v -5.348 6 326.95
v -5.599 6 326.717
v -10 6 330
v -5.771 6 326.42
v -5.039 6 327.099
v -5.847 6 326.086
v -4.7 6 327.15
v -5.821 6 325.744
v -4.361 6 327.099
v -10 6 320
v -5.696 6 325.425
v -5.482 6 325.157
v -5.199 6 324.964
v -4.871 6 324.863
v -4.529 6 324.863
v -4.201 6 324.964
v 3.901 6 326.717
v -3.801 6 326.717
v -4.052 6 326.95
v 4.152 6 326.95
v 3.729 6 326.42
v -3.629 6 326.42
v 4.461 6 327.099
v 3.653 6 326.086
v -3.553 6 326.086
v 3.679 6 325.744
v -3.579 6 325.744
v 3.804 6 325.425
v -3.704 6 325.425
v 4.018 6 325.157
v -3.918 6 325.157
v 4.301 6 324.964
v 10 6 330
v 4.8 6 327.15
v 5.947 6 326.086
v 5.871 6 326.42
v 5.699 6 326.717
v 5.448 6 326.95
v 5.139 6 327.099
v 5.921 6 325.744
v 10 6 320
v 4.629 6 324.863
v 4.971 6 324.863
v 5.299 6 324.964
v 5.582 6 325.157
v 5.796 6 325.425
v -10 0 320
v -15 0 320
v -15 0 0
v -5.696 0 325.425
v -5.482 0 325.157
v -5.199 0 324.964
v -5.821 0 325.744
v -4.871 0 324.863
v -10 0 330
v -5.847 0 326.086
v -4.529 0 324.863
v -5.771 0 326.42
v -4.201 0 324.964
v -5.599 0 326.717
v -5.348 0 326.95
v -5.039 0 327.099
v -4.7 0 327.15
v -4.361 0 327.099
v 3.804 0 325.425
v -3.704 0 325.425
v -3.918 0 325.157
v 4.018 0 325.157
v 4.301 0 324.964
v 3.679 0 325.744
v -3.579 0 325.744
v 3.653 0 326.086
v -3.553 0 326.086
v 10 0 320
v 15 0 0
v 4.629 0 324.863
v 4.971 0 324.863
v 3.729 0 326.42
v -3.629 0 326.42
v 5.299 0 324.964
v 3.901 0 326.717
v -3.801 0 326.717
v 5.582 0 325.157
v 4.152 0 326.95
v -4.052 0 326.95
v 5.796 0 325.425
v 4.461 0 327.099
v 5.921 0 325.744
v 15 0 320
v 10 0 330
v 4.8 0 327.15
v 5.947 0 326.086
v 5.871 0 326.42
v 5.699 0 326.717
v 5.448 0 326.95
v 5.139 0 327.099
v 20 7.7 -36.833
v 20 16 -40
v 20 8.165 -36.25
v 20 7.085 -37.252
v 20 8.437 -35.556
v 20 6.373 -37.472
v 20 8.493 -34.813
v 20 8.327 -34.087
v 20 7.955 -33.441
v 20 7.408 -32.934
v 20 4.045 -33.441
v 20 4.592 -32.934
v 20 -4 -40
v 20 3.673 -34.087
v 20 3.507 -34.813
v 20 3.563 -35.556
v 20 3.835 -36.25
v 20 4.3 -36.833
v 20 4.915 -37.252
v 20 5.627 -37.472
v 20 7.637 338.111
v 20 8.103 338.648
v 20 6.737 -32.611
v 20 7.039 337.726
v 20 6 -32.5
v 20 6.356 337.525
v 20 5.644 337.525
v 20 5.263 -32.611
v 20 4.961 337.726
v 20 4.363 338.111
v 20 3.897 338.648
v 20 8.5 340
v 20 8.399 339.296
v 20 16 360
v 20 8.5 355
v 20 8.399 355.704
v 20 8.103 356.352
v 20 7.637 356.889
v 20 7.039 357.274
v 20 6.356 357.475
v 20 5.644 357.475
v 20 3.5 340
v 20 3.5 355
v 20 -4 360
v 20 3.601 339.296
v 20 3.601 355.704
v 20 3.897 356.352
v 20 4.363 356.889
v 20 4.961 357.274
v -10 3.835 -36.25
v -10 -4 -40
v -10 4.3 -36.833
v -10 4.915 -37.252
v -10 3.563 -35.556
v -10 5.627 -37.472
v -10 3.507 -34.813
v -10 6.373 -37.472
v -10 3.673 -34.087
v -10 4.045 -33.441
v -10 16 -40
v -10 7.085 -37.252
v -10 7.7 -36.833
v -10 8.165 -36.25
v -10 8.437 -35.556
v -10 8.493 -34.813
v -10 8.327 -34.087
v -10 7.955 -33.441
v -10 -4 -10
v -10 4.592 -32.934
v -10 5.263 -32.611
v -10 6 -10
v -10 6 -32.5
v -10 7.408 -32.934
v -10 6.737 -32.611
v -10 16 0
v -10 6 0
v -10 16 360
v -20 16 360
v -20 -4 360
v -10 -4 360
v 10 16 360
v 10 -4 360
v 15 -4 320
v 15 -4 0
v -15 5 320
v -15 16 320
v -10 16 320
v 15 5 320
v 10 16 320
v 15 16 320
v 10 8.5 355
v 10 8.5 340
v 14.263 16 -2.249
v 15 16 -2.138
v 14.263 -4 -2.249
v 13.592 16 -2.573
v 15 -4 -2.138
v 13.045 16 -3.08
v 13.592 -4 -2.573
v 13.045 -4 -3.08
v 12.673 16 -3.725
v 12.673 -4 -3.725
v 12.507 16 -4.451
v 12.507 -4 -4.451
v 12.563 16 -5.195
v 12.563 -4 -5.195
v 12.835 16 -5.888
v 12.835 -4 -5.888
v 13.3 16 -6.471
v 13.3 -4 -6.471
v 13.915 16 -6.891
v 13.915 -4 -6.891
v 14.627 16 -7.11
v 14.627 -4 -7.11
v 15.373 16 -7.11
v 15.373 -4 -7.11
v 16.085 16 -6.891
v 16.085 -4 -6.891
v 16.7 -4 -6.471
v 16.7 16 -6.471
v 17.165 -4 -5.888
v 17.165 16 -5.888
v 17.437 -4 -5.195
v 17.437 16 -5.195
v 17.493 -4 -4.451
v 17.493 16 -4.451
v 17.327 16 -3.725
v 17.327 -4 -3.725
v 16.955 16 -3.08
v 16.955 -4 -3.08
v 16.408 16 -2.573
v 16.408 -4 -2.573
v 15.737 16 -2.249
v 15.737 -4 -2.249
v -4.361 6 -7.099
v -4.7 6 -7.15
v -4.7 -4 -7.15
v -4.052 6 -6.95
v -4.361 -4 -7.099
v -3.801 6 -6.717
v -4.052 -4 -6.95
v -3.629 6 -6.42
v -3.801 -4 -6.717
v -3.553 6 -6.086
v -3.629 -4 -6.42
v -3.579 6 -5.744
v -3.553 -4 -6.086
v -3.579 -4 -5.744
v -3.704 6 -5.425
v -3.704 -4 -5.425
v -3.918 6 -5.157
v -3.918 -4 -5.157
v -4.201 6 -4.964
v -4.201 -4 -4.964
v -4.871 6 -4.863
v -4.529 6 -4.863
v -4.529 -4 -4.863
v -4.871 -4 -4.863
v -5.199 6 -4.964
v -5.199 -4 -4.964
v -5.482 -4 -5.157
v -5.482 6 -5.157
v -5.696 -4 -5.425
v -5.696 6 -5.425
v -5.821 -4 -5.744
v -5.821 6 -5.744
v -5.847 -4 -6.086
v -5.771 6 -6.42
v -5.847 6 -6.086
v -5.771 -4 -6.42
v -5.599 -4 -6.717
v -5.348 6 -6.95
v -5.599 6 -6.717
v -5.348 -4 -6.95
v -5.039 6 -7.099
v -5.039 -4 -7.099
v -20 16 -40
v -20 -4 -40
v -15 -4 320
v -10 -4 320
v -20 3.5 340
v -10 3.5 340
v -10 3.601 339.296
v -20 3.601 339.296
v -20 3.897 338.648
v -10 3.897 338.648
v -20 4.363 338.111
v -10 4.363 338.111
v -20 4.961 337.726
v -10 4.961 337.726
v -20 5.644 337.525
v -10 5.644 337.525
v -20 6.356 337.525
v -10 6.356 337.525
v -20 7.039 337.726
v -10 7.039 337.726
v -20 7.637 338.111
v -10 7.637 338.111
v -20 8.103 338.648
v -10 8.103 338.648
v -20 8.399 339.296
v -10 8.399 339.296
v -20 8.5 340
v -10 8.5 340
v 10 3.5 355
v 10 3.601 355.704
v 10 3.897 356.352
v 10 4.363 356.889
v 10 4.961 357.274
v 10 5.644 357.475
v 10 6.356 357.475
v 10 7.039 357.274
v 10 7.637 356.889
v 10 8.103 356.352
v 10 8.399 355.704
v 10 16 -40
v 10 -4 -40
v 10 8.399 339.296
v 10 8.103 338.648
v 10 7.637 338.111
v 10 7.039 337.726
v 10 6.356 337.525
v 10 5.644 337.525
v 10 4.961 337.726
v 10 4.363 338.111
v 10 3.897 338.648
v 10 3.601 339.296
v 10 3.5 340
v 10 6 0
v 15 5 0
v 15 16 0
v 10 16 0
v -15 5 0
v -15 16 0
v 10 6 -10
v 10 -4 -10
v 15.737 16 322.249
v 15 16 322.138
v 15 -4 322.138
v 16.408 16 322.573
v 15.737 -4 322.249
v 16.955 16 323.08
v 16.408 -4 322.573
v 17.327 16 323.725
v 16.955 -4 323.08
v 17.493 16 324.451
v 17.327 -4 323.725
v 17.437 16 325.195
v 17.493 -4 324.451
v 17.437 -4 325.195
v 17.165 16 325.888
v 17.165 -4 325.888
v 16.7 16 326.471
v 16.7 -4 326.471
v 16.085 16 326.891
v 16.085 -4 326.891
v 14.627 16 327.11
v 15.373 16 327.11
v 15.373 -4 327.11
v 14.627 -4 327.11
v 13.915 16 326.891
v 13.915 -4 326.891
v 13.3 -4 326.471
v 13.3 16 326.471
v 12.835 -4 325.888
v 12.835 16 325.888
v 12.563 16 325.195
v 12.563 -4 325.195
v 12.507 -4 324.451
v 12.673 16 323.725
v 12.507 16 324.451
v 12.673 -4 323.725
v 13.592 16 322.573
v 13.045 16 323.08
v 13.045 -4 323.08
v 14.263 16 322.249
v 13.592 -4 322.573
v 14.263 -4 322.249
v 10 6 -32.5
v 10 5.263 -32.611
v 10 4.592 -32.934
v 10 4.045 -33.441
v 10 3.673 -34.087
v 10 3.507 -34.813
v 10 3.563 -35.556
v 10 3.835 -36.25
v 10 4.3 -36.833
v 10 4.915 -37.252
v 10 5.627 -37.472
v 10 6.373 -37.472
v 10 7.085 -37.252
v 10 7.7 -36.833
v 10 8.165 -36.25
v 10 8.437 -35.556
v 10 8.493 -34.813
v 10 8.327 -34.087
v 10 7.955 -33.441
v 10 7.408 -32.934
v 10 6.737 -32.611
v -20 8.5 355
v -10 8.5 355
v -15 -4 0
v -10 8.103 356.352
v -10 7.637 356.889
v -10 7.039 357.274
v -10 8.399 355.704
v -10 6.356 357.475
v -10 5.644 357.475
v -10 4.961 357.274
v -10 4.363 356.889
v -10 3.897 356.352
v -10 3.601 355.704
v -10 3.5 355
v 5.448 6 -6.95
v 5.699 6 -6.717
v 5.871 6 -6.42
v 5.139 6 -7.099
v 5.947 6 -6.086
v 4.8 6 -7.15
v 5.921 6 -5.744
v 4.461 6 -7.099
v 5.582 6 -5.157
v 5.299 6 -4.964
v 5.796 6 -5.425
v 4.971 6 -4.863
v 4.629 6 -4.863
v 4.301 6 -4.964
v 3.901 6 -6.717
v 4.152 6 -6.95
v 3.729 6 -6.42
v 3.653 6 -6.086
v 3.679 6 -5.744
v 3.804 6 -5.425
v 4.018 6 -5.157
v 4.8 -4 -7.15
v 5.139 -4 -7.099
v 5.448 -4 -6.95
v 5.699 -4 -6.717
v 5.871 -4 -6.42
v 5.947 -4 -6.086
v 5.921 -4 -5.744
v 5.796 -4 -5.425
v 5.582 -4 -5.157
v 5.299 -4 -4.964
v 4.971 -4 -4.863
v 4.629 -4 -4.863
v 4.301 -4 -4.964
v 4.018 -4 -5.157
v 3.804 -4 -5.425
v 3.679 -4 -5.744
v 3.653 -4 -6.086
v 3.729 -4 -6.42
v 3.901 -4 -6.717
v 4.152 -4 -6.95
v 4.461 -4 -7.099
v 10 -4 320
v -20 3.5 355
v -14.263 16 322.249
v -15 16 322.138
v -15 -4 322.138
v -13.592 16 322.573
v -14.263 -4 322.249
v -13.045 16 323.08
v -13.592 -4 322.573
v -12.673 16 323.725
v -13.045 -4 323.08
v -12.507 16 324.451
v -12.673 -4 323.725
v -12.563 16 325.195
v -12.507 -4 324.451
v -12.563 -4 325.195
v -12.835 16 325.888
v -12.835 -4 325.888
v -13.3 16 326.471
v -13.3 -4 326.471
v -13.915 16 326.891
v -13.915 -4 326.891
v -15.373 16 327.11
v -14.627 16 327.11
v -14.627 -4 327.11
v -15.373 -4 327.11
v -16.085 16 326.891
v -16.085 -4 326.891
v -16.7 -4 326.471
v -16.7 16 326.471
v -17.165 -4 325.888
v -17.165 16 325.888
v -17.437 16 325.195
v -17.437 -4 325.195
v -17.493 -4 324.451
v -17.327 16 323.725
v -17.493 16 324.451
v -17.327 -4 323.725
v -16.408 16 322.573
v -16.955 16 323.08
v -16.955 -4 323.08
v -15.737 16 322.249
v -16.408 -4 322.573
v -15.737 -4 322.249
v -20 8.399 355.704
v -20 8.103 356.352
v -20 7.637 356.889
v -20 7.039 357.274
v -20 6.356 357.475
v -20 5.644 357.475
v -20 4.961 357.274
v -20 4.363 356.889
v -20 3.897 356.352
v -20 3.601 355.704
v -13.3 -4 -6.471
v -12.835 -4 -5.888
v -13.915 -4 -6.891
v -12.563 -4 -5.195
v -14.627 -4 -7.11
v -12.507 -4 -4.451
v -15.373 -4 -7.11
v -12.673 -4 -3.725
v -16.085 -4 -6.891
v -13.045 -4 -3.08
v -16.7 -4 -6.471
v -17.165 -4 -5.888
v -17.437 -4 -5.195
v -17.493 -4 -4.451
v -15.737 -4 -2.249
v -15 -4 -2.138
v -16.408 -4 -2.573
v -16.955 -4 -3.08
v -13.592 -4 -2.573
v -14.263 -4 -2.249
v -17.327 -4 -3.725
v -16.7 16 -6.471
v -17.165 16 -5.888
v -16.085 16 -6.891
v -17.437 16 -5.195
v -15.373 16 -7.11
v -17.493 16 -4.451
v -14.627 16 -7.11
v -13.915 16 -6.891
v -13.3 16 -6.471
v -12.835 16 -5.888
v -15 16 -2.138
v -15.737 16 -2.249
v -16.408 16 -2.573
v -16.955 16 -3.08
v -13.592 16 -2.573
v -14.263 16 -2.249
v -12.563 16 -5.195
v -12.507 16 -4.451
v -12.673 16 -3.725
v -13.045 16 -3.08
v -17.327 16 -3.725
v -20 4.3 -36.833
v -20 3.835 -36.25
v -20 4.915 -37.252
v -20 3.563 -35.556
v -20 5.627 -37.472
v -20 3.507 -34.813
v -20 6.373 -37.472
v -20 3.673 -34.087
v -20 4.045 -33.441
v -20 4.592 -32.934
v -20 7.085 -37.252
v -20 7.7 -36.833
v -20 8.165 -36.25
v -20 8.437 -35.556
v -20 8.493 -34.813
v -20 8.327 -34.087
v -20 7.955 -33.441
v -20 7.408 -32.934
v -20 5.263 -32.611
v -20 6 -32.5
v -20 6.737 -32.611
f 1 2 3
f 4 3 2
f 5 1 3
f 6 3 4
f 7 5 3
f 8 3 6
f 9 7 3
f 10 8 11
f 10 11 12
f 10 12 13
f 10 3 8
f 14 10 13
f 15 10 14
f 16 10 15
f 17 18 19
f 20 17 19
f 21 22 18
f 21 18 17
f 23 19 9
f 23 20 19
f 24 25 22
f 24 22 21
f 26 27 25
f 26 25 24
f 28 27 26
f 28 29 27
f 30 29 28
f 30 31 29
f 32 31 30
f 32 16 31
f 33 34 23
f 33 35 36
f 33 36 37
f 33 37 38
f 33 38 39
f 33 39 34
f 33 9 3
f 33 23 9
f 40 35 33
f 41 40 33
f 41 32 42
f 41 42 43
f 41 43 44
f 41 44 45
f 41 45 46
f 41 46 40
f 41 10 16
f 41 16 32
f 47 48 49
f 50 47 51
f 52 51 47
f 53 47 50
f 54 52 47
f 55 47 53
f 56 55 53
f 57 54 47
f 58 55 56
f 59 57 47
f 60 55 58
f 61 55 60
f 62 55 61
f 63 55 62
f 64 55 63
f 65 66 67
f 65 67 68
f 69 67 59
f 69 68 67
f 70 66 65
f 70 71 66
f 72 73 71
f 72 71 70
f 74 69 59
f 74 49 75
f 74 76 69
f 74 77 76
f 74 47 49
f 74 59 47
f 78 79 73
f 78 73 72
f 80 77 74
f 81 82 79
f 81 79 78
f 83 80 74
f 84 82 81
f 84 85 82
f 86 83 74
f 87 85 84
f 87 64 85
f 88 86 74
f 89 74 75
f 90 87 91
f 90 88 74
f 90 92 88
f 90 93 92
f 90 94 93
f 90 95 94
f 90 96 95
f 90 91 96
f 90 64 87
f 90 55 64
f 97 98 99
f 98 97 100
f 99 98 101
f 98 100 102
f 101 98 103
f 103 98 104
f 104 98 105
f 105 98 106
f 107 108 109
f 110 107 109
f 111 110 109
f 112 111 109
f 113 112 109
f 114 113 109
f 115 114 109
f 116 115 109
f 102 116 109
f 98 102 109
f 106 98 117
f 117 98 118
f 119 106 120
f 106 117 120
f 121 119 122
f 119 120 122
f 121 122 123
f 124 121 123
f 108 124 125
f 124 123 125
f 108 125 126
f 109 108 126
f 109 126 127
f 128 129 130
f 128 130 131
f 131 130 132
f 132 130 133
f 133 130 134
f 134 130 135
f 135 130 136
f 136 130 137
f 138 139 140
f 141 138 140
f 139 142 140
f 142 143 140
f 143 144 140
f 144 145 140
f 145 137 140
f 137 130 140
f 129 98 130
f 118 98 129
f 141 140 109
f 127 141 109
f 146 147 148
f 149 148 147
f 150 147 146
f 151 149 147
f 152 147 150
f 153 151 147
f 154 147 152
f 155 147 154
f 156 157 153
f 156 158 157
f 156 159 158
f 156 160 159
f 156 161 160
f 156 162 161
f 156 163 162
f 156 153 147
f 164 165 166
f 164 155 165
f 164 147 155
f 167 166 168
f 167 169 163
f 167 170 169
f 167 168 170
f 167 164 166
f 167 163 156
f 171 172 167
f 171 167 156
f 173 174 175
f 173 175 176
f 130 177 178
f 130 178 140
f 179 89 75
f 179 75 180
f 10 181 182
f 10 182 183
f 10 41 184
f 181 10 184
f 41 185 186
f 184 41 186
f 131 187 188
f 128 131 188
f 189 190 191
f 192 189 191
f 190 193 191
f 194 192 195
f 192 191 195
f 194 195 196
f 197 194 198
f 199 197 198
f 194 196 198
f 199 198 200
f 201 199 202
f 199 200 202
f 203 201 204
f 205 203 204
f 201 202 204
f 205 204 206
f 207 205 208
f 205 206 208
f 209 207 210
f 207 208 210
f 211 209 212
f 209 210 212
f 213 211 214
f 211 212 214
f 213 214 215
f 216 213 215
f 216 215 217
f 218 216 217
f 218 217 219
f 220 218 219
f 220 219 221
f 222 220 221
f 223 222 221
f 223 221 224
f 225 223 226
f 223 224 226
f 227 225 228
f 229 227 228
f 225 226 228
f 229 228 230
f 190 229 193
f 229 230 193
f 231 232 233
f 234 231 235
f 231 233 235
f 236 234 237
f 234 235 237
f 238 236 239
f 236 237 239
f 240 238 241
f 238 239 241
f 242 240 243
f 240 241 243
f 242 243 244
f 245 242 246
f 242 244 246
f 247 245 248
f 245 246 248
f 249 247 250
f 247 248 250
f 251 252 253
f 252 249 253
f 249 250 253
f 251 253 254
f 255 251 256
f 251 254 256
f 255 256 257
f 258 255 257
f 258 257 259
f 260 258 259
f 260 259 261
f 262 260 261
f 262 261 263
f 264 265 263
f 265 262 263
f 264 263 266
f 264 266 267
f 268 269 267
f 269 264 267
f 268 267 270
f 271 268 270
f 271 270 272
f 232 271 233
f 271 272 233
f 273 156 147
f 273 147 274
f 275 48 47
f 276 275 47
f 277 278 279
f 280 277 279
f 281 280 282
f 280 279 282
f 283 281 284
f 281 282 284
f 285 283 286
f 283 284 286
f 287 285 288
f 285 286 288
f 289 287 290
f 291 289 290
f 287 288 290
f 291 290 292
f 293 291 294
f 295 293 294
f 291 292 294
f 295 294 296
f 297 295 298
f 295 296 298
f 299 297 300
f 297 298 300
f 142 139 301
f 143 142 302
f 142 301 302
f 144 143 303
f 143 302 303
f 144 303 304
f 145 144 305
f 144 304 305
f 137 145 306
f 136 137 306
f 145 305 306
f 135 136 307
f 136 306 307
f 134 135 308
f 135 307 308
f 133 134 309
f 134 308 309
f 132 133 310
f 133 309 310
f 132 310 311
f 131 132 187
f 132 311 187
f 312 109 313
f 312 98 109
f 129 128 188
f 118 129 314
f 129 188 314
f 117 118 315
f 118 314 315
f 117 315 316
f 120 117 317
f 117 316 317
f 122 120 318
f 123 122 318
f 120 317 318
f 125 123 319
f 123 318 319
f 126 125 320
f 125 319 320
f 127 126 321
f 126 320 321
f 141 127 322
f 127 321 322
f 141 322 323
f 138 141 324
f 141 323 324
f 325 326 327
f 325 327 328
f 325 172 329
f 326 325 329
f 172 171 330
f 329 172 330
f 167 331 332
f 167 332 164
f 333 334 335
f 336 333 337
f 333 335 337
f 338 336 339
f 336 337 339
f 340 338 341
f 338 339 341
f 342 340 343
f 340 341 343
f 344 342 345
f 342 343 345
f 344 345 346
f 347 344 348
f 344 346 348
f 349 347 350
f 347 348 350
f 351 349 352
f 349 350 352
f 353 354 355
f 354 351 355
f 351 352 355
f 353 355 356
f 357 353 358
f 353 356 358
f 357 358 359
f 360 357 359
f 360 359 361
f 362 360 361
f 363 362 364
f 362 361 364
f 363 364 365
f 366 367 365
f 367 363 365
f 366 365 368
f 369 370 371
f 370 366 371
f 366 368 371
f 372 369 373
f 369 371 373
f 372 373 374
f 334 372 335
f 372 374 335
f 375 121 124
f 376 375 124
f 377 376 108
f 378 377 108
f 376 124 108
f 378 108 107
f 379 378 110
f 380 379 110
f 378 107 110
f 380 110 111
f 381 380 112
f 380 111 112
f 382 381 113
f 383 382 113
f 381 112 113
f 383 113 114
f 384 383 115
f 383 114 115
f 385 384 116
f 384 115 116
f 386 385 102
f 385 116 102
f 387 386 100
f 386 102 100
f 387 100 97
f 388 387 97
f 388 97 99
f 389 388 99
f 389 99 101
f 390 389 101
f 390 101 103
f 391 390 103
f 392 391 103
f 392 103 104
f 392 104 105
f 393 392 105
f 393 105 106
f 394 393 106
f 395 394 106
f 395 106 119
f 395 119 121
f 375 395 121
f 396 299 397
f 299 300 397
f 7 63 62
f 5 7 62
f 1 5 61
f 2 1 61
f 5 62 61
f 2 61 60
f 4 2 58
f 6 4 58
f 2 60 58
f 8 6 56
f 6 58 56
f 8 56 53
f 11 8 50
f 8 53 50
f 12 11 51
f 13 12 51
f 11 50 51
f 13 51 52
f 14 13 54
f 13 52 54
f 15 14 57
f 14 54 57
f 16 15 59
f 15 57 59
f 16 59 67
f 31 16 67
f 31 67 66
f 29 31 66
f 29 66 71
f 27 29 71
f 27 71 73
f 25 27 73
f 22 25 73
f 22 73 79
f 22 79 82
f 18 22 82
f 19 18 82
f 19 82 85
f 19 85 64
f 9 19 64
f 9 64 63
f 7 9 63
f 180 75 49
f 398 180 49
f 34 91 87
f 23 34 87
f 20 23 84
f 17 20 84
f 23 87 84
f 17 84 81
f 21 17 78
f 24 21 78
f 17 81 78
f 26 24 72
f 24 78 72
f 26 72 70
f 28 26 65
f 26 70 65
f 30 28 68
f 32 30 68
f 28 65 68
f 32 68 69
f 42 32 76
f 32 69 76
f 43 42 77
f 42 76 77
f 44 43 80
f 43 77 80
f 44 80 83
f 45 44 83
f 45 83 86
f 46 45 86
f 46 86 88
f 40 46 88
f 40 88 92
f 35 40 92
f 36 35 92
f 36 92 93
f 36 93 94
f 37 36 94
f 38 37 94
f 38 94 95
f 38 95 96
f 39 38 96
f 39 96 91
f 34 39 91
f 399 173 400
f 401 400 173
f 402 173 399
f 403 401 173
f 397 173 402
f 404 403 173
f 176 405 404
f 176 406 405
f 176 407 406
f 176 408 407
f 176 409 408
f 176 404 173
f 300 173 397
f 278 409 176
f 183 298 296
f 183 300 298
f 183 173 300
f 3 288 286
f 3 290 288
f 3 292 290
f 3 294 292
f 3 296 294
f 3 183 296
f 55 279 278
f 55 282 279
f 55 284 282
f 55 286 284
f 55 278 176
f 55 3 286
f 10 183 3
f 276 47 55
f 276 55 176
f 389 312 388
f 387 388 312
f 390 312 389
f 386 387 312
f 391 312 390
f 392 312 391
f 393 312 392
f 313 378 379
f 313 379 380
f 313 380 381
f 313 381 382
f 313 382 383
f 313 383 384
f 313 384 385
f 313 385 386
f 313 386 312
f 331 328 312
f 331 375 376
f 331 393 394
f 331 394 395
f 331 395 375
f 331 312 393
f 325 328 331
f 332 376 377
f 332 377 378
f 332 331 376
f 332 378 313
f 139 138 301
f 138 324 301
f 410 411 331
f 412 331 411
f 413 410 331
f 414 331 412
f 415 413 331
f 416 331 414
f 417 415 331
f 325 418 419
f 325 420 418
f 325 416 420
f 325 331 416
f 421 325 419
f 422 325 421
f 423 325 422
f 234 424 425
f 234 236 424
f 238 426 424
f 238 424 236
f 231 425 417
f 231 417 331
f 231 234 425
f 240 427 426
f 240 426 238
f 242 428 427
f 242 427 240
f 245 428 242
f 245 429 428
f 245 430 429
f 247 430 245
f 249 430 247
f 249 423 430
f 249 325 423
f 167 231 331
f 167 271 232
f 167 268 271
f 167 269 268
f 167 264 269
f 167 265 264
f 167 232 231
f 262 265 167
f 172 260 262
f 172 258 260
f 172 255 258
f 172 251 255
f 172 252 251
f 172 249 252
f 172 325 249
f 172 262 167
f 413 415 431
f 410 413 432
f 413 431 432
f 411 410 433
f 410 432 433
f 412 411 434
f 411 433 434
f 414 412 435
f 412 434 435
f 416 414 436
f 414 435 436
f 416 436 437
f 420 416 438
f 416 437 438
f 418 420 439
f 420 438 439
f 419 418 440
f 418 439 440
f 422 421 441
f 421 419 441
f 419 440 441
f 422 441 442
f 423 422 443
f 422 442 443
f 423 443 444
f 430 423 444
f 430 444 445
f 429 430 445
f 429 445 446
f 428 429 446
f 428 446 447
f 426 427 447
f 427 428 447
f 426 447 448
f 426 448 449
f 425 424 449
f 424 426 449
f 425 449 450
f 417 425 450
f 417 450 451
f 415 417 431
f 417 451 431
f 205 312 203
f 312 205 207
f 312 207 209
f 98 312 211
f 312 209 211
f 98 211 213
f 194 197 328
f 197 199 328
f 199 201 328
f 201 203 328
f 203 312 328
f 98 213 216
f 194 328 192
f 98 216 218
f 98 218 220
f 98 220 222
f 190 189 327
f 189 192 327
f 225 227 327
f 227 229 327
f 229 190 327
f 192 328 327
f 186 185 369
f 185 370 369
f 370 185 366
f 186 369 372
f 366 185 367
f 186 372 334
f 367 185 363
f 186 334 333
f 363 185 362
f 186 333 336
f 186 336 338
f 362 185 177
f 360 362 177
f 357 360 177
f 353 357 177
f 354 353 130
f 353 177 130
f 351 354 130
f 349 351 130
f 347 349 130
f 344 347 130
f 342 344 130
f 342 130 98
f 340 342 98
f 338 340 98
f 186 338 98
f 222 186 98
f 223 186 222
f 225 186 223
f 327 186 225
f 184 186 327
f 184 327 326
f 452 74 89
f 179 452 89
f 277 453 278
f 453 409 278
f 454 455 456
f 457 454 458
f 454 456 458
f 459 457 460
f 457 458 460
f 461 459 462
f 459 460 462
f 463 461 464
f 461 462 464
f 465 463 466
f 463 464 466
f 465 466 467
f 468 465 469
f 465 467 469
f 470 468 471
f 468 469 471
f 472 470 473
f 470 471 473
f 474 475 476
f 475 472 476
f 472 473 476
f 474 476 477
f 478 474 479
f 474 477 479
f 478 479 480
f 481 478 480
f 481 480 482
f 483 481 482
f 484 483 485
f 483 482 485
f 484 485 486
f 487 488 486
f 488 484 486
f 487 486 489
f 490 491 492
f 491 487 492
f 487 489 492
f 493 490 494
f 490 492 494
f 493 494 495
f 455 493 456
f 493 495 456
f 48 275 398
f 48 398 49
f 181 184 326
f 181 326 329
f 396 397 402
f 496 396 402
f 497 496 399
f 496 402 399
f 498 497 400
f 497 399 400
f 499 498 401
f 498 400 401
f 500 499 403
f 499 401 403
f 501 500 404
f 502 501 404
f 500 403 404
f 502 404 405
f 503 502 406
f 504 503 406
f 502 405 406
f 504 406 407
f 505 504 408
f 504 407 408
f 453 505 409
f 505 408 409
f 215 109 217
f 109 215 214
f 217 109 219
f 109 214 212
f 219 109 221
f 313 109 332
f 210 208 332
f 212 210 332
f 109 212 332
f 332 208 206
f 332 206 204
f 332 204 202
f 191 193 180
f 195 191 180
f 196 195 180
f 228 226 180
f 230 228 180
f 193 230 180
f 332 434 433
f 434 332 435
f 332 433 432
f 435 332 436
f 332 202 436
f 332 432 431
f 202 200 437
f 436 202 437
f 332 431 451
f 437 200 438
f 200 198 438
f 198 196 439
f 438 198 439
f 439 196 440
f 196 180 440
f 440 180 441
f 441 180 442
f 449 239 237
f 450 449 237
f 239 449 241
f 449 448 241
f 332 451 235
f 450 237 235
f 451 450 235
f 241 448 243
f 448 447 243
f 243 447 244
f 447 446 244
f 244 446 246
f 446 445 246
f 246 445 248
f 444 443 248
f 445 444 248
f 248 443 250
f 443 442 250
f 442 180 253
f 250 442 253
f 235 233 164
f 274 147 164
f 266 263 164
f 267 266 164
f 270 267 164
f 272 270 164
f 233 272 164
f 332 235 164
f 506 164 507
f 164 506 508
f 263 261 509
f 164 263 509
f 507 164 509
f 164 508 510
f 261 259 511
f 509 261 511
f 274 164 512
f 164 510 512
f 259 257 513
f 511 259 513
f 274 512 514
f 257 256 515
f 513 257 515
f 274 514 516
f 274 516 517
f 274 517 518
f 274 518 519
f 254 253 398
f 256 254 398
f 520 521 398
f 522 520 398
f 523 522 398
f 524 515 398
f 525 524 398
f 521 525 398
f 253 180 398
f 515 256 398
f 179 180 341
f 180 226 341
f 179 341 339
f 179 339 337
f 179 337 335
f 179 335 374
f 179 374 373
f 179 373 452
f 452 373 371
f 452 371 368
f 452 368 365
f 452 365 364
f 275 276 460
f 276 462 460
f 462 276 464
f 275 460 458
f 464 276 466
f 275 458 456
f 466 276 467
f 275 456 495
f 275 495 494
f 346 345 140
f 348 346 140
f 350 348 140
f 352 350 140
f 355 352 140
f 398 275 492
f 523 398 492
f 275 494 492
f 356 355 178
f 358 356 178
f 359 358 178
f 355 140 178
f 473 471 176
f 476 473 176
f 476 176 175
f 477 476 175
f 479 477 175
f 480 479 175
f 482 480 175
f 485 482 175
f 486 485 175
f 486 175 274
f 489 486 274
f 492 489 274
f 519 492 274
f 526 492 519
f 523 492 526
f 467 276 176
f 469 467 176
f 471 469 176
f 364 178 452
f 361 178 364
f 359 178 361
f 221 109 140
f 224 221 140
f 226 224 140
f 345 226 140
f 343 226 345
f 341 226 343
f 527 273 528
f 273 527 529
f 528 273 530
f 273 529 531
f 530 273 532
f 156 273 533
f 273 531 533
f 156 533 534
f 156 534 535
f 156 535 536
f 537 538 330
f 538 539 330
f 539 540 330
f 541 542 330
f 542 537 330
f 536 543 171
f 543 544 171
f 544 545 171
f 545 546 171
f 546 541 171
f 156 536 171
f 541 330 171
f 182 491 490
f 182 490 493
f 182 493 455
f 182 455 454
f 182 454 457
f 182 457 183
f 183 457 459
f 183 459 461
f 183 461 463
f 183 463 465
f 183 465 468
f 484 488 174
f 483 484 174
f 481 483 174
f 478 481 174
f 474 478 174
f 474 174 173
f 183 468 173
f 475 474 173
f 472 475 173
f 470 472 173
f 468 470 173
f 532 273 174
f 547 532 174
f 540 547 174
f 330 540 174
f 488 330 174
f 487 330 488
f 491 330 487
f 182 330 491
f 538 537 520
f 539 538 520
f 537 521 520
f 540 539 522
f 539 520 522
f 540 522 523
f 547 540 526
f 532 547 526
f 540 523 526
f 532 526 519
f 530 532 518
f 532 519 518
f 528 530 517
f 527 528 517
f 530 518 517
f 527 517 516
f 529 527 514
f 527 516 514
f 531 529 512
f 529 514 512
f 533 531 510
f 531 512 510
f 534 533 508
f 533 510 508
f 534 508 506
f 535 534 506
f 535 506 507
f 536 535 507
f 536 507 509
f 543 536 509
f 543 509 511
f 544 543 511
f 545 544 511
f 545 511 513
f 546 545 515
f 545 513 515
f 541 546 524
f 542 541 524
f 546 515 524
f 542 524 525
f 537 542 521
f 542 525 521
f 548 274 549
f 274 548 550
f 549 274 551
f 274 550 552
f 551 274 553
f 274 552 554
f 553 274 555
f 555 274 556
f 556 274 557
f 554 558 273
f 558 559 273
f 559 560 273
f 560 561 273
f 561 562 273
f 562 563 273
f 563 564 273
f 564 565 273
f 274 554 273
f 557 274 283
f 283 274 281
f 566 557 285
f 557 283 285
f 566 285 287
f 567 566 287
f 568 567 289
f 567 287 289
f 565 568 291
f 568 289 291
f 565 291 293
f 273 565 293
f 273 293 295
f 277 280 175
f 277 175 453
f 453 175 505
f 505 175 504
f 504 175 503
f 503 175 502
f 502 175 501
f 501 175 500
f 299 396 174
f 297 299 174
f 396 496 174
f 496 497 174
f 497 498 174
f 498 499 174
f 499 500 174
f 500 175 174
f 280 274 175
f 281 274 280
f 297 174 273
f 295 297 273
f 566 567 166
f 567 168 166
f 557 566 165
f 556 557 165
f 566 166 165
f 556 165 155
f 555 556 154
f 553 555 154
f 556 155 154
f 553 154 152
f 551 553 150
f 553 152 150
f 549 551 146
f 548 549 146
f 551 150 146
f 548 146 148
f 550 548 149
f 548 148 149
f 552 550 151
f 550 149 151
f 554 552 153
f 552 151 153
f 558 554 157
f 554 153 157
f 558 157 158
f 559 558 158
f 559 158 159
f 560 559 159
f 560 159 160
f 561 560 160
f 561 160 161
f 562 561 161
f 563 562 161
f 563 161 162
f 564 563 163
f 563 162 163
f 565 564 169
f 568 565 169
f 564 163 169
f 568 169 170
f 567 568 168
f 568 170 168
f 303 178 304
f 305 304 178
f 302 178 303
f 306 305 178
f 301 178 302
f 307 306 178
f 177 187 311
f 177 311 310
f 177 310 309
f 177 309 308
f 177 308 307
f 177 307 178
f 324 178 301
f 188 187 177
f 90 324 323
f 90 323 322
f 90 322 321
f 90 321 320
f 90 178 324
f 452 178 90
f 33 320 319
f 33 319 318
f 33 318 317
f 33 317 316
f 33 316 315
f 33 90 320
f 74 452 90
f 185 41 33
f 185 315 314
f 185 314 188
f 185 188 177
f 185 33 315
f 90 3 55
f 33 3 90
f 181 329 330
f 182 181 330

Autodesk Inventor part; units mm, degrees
ref_plane "YZ Plane" through (0, 0, 0) normal (1, 0, 0) x (0, 1, 0)
ref_plane "XZ Plane" through (0, 0, 0) normal (0, 1, 0) x (-1, 0, 0)
ref_plane "XY Plane" through (0, 0, 0) normal (0, 0, 1) x (1, 0, 0)
sketch "Sketch1" plane through (0, 0, 0) normal (0, 0, 1) x (1, 0, 0)
  line L0 (0, 0) -> (20, 0)
  line L1 (20, 0) -> (20, 16)
  line L2 (20, 16) -> (15, 16)
  line L3 (15, 16) -> (15, 5)
  line L4 (15, 5) -> (0, 5)
  line L5 (0, 5) -> (0, 0)
  line L6 (20, 0) -> (15, 0)
  line L7 (15, 0) -> (15, -4)
  line L8 (15, -4) -> (20, -4)
  line L9 (20, -4) -> (20, 0)
  dimension "d0" = 5
  dimension "d1" = 20
  dimension "d2" = 5
  dimension "d3" = 16
  dimension "d4" = 20
extrude "Extrusion1" add sketch "Sketch1" along normal blind 320
mirror "Mirror1" about plane through (0, 0, 0) normal (1, 0, 0) of "Extrusion1"
ref_plane "Work Plane1" through (0, 0, 160) normal (0, 0, 1) x (1, 0, 0)
sketch "Sketch3" plane through (0, 0, 0) normal (0, 0, -1) x (-1, 0, 0)
  line L0 (20, -4) -> (20, 16) projected
  line L1 (-15, -4) -> (-20, -4) projected
  line L2 (20, 16) -> (-20, 16)
  line L3 (-20, 16) -> (-20, -4)
  line L4 (-20, -4) -> (20, -4)
  line L5 (20, -4) -> (20, 16)
  point P0 (0, 0)
extrude "Extrusion2" add sketch "Sketch3" along normal blind 10
ref_plane "Work Plane2" through (0, -4, 320) normal (-1, 0, 0) x (0, 0, 1)
sketch "Sketch4" plane through (-15, 16, 0) normal (0, 1, 0) x (1, 0, 0)
  line L0 (15, -386) -> (15, 76) projected
  point P0 (15, 0)
  point P1 (0, 4.6383)
  point P2 (30, 4.6383)
  dimension "d9" = 30
  dimension "d10" = 15
hole "Hole1" at (-15, 16, -4.6383) at (15, 16, -4.6383) direction (0, -1, 0) diameter 5 end through all
mirror "Mirror3" about plane through (0, 0, 160) normal (0, 0, 1) of "Extrusion2", "Hole1"
sketch "Sketch5" plane through (-20, 16, -10) normal (0, 1, 0) x (1, 0, 0)
  line L0 (35, -330) -> (5, -330) projected
  line L1 (0, -340) -> (40, -340) projected
  line L2 (30, -330) -> (10, -330)
  line L3 (10, -330) -> (10, -340)
  line L4 (10, -340) -> (30, -340)
  line L5 (30, -340) -> (30, -330)
  line L6 (20, -396) -> (20, 66) projected
  point P0 (20, -10)
  point P1 (20, -340)
  point P2 (20, -330)
  dimension "d18" = 20
  dimension "d31" = 10
extrude "Extrusion3" cut sketch "Sketch5" against normal blind 10
sketch "Sketch6" plane through (-20, 6, -10) normal (0, 1, 0) x (1, 0, 0)
  line L0 (30, -340) -> (10, -340) projected
  line L1 (30, -330) -> (30, -340) projected
  point P0 (20, -10)
  point P1 (24.8, -336)
  point P2 (15.3, -336)
  dimension "d21" = 4
  dimension "d22" = 9.5
  dimension "d30" = 5.2
hole "Hole2" at (4.8, 6, 326) at (-4.7, 6, 326) direction (0, -1, 0) diameter 2.3 end through all
mirror "Mirror4" about plane through (0, 0, 160) normal (0, 0, 1) of "Hole2", "Extrusion3"
sketch "Sketch7" plane through (-20, -4, 330) normal (0, 0, 1) x (1, 0, 0)
  line L0 (10, 20) -> (10, 10) projected
  line L1 (10, 20) -> (0, 20)
  line L2 (0, 20) -> (0, 0)
  line L3 (0, 0) -> (10, 0)
  line L4 (10, 0) -> (10, 20)
  line L5 (40, 0) -> (0, 0) projected
  line L6 (0, 0) -> (0, 20) projected
  point P0 (20, 4)
  point P1 (10, 10)
extrude "Extrusion4" add sketch "Sketch7" along normal blind 30
mirror "Mirror6" about plane through (0, 0, 160) normal (0, 0, 1) of "Extrusion4"
mirror "Mirror7" about plane through (0, -4, 320) normal (-1, 0, 0) of "Extrusion4", "Mirror6"
sketch "Sketch10" plane through (-10, -4, 330) normal (1, 0, 0) x (0, 0, -1)
  line L0 (-10, 10) -> (-25, 10) construction
  line L1 (-10, 12.5) -> (-25, 12.5)
  line L2 (-25, 7.5) -> (-10, 7.5)
  arc A0 (-10, 7.5) -> (-10, 12.5) centre (-10, 10) ccw
  arc A1 (-25, 12.5) -> (-25, 7.5) centre (-25, 10) ccw
  line L3 (-30, 0) -> (-30, 20) projected
  line L4 (0, 0) -> (-30, 0) projected
  point P0 (330, 4)
  point P1 (-17.5, 10)
  dimension "d45" = 2.5
  dimension "d46" = 15
  dimension "d47" = 5
  dimension "d48" = 10
extrude "Extrusion6" cut sketch "Sketch10" against normal through all
mirror "Mirror5" about plane through (0, -4, 320) normal (-1, 0, 0) of "Extrusion4", "Extrusion6"
sketch "Sketch9" plane through (-20, -4, -10) normal (0, -1, 0) x (1, 0, 0)
  line L0 (10, 340) -> (10, 370) projected
  line L1 (30, 330) -> (30, 340) projected
  line L2 (10, 340) -> (30, 340)
  line L3 (30, 340) -> (30, 330)
  line L4 (30, 330) -> (10, 330)
  line L5 (10, 330) -> (10, 340)
  point P0 (20, 10)
extrude "Extrusion5" cut sketch "Sketch9" against normal up to surface (4 mm away)
sketch "Sketch11" plane through (-20, -4, 360) normal (-1, 0, 0) x (0, 0, 1)
  line L0 (-400, 20) -> (-400, 0) projected
  line L1 (0, 20) -> (-400, 20) projected
  point P0 (-360, 4)
  point P1 (-395, 10)
  point P2 (-400, 10)
  dimension "d51" = 5
  dimension "d52" = 10
hole "Hole4" at (-20, 6, -35) direction (1, 0, 0) diameter 5 end through all
equation "\"d10\" = 0.5 * d9"
properties part number "Sledge_rail" material "PC/ABS Plastic"
